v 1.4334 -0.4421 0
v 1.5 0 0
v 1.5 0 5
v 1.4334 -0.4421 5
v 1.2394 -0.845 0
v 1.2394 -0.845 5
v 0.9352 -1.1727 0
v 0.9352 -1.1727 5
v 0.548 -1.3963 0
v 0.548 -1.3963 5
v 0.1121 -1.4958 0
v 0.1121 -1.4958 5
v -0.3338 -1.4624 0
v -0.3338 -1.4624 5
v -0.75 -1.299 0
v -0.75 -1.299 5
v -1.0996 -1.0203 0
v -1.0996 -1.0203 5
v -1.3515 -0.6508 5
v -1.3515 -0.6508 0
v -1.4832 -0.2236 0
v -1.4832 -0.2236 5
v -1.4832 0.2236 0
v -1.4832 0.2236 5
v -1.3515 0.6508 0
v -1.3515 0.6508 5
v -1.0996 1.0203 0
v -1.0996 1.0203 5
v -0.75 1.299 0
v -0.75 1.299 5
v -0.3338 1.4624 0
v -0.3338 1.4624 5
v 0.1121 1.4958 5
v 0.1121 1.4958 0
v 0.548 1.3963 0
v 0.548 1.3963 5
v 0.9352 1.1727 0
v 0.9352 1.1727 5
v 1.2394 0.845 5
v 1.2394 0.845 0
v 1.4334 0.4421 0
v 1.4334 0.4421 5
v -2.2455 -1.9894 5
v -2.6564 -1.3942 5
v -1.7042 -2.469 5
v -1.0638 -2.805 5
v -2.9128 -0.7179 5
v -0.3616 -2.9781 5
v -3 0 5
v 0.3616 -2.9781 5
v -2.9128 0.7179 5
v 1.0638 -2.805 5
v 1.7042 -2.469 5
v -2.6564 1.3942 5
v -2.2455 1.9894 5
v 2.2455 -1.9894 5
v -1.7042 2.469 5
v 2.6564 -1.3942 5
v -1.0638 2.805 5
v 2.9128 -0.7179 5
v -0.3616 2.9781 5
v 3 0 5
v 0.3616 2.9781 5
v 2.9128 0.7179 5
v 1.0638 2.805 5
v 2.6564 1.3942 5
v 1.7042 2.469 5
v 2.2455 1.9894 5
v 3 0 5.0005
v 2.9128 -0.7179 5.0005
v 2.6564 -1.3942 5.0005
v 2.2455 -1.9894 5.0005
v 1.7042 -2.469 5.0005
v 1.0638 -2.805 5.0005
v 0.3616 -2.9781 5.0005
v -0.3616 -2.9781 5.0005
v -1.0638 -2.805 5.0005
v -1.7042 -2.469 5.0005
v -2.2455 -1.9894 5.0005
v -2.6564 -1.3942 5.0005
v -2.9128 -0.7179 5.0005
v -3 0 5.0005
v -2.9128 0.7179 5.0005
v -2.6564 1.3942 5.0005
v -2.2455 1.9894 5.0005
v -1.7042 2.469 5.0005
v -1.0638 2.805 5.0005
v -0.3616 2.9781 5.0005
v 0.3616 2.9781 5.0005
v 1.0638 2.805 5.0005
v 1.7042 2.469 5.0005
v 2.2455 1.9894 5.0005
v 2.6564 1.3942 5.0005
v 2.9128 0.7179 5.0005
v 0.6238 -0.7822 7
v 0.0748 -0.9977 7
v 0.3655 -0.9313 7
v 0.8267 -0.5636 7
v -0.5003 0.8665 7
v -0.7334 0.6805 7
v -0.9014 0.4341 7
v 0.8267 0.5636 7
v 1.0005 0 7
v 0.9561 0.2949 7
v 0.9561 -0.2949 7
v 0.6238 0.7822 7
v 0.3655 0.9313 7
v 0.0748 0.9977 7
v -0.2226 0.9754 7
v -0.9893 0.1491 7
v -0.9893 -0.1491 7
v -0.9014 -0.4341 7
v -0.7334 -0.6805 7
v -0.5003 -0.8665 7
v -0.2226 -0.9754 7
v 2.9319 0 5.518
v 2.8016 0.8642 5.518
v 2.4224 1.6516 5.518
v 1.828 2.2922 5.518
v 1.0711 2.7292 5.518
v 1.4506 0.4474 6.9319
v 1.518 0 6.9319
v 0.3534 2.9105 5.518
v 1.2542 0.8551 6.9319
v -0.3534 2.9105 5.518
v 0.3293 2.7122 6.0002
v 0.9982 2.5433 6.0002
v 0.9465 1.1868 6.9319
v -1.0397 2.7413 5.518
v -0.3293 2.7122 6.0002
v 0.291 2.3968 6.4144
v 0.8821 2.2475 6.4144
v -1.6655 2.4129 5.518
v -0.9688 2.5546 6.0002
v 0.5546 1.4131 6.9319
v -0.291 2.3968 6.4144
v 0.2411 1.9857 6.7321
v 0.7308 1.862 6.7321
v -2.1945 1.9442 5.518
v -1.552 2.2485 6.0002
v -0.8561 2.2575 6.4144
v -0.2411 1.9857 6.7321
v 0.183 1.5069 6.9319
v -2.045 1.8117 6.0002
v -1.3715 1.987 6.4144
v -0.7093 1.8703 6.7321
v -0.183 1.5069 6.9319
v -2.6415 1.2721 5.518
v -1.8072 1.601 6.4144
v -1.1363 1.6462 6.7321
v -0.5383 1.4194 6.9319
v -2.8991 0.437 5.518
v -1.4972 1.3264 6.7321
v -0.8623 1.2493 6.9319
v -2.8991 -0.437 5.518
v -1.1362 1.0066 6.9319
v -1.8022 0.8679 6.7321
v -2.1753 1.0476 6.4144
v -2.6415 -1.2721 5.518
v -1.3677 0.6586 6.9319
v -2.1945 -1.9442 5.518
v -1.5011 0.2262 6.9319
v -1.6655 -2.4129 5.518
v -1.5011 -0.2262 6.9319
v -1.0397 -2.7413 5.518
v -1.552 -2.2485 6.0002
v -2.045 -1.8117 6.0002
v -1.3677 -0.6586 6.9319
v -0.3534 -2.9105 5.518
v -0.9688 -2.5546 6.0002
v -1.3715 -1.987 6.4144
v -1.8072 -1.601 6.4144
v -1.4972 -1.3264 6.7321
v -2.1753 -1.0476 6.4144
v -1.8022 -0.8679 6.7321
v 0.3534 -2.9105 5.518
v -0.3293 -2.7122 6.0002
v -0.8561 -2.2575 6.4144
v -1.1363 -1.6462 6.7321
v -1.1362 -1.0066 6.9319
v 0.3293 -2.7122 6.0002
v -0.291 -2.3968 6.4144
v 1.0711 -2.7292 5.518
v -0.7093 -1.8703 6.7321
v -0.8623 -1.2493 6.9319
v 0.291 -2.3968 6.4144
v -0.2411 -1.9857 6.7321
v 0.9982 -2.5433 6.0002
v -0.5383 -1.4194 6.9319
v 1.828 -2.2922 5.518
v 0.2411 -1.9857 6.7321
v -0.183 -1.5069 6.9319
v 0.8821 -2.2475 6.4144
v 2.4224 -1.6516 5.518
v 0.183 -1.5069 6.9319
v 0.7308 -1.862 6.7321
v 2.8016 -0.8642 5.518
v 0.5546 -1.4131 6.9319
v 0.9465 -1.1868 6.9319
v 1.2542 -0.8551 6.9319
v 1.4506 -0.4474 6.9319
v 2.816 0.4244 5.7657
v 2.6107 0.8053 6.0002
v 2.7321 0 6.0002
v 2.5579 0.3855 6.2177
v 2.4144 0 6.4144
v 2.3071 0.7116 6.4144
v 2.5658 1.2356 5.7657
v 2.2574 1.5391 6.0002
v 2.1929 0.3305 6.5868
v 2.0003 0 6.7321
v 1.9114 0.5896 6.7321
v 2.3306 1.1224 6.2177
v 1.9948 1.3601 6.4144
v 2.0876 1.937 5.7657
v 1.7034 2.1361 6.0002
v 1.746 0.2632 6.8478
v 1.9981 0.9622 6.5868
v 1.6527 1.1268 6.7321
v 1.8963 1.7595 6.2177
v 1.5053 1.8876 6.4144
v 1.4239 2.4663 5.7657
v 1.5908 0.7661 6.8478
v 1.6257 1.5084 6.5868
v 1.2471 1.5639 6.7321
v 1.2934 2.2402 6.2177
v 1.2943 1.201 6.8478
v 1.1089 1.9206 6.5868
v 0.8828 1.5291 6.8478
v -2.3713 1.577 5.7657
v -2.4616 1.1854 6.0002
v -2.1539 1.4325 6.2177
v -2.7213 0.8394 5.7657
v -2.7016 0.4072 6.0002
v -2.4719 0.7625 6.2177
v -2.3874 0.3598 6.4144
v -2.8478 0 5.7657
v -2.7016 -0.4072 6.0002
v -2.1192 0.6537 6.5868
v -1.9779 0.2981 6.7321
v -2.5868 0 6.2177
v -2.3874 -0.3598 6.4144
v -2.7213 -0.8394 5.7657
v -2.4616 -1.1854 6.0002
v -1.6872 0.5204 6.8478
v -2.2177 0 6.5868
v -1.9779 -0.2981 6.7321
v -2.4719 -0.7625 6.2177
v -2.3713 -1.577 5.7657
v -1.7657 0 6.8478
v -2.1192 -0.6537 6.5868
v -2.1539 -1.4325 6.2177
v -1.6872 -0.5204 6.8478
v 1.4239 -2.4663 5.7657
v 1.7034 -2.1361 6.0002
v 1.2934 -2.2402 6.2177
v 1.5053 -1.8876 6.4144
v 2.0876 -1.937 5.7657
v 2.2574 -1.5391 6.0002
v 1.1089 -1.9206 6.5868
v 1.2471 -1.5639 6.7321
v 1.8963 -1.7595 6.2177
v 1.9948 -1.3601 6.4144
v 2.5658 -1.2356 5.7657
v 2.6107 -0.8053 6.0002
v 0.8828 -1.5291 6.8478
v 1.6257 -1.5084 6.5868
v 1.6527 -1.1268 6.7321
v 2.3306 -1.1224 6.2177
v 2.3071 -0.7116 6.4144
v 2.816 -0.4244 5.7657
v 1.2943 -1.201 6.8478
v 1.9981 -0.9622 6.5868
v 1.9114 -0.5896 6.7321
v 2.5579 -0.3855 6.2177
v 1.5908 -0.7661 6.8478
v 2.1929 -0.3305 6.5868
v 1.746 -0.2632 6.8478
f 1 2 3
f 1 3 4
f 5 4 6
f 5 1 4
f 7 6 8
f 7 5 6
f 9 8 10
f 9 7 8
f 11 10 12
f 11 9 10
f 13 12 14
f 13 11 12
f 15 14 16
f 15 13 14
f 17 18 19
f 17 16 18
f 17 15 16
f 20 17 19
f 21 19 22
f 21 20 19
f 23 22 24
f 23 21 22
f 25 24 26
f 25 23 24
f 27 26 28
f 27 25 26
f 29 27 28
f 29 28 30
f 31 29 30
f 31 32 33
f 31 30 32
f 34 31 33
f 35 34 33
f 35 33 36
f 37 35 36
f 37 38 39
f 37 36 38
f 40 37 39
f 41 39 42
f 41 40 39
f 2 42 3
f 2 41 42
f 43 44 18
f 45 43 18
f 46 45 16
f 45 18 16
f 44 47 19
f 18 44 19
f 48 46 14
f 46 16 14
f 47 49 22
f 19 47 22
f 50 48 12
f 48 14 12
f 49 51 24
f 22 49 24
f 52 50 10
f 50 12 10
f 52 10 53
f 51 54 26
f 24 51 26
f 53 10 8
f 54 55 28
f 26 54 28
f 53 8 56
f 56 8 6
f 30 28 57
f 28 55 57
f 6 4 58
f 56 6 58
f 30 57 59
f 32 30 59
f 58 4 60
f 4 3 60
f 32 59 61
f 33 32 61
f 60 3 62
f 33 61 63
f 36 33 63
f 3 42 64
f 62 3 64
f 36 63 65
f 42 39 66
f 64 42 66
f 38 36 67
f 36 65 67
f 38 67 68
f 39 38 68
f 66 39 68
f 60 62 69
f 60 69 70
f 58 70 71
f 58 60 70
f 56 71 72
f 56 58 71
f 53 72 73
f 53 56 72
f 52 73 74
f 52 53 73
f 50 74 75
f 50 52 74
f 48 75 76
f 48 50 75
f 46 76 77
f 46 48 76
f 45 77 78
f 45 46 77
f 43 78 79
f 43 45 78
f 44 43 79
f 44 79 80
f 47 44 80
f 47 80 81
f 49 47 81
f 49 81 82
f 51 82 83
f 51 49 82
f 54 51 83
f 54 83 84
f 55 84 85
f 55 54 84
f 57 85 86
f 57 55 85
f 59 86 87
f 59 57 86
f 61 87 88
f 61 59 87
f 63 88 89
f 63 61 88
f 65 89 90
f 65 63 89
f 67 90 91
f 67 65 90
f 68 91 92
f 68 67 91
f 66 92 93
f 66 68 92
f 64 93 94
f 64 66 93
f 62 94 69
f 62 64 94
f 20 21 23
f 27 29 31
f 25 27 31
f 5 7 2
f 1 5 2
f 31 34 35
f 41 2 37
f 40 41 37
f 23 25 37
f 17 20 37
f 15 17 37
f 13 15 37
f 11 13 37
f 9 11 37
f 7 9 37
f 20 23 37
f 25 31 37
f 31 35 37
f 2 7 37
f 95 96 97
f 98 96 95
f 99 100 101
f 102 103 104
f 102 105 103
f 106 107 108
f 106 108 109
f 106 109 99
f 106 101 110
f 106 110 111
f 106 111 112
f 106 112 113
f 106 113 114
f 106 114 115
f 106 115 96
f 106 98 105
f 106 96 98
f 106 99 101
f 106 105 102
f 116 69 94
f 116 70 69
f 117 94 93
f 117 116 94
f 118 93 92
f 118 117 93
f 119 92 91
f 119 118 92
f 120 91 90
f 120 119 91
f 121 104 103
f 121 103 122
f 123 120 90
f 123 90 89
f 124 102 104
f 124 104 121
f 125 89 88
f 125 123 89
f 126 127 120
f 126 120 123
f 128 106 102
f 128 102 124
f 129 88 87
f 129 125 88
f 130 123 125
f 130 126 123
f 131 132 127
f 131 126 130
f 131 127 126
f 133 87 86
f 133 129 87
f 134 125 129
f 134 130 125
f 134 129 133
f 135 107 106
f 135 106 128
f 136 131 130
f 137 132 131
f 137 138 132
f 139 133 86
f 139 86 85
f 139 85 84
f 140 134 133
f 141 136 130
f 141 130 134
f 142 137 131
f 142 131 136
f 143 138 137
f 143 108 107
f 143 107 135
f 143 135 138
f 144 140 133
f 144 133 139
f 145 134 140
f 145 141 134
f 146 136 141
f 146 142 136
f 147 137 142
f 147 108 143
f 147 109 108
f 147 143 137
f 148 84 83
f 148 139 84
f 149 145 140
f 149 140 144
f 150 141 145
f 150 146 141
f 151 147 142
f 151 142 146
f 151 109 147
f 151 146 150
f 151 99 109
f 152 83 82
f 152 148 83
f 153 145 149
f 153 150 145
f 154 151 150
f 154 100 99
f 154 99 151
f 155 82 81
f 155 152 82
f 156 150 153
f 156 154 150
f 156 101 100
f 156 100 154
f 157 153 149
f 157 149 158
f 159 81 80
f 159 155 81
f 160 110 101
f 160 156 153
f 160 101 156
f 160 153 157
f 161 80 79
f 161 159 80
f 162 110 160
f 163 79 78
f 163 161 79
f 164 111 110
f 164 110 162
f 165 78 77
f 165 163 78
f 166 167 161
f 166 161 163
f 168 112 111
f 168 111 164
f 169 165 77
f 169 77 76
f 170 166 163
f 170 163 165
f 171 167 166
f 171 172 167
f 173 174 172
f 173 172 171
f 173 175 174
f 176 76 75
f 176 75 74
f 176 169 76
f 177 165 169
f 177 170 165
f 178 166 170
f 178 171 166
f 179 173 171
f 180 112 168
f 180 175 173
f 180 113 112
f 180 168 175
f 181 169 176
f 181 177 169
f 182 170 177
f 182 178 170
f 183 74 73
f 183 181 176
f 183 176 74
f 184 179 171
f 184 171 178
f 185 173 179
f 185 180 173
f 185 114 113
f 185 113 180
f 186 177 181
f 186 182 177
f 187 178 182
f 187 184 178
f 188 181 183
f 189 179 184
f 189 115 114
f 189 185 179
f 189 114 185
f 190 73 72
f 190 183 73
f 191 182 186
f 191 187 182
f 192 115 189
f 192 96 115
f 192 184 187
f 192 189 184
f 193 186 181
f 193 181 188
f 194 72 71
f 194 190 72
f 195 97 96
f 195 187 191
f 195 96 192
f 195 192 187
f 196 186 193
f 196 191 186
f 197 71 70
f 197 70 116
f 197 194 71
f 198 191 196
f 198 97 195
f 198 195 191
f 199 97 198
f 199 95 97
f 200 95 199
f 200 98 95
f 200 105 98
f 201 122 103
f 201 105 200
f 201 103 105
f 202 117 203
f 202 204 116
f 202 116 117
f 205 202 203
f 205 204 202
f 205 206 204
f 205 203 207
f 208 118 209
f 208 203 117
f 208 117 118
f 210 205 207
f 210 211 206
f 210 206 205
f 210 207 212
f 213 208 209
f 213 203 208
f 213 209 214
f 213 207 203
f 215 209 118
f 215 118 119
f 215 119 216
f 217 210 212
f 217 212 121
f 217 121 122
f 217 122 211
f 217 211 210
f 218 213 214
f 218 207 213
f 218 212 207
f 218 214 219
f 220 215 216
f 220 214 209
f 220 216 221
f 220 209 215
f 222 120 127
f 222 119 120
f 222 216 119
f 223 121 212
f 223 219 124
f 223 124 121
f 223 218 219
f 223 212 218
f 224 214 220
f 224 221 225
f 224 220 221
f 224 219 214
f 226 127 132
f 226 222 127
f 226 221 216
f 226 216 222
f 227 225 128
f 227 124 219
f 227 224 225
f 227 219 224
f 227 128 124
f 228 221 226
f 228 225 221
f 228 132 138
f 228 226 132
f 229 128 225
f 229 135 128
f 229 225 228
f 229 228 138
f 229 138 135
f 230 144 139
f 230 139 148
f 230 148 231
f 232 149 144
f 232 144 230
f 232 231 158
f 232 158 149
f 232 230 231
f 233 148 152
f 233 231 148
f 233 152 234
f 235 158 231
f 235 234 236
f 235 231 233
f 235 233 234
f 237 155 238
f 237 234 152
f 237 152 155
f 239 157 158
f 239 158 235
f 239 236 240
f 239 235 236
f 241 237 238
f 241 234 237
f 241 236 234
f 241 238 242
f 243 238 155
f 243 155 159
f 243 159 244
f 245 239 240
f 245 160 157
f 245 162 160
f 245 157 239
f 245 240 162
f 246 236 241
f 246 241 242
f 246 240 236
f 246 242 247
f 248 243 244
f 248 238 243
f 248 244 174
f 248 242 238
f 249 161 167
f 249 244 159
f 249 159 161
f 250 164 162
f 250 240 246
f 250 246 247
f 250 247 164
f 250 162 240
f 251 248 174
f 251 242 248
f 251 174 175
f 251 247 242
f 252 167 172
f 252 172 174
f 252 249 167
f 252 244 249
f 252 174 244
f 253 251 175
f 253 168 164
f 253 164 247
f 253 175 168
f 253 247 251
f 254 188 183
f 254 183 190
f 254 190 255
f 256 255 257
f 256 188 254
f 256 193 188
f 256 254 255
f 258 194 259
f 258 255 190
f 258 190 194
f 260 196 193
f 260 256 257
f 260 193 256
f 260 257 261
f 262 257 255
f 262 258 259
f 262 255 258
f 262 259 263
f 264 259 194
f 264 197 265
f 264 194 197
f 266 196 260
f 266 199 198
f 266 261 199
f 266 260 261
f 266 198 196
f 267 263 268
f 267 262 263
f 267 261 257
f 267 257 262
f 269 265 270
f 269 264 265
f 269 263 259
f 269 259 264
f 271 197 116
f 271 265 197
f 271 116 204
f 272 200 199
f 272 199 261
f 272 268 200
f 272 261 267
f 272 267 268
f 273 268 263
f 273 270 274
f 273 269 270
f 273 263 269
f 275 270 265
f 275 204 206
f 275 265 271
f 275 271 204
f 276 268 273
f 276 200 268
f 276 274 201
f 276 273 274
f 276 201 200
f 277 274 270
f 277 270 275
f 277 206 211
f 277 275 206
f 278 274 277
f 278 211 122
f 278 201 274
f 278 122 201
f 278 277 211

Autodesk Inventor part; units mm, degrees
ref_plane "YZ Plane" through (0, 0, 0) normal (1, 0, 0) x (0, 1, 0)
ref_plane "XZ Plane" through (0, 0, 0) normal (0, 1, 0) x (-1, 0, 0)
ref_plane "XY Plane" through (0, 0, 0) normal (0, 0, 1) x (1, 0, 0)
sketch "スケッチ1" plane through (0, 0, 0) normal (0, 0, 1) x (1, 0, 0)
  circle A0 centre (0, 0) radius 1.5
  dimension "d0" = 3
extrude "押し出し1" add sketch "スケッチ1" along normal blind 5
sketch "スケッチ2" plane through (0, 0, 5) normal (0, 0, 1) x (1, 0, 0)
  circle A0 centre (0, 0) radius 1.5 projected
  circle A1 centre (0, 0) radius 3
  dimension "d3" = 6
extrude "押し出し2" add sketch "スケッチ2" along normal blind 2 contours A0 | A1
fillet "フィレット1" radius 2 1 edges at (-3, 0, 7)
thread "ねじ1" size "M3x0.5" class "6g" standard "ANSI Metric M Profile" full length
properties part number "SB　5mmなべネジ" material "Steel, Mild"
